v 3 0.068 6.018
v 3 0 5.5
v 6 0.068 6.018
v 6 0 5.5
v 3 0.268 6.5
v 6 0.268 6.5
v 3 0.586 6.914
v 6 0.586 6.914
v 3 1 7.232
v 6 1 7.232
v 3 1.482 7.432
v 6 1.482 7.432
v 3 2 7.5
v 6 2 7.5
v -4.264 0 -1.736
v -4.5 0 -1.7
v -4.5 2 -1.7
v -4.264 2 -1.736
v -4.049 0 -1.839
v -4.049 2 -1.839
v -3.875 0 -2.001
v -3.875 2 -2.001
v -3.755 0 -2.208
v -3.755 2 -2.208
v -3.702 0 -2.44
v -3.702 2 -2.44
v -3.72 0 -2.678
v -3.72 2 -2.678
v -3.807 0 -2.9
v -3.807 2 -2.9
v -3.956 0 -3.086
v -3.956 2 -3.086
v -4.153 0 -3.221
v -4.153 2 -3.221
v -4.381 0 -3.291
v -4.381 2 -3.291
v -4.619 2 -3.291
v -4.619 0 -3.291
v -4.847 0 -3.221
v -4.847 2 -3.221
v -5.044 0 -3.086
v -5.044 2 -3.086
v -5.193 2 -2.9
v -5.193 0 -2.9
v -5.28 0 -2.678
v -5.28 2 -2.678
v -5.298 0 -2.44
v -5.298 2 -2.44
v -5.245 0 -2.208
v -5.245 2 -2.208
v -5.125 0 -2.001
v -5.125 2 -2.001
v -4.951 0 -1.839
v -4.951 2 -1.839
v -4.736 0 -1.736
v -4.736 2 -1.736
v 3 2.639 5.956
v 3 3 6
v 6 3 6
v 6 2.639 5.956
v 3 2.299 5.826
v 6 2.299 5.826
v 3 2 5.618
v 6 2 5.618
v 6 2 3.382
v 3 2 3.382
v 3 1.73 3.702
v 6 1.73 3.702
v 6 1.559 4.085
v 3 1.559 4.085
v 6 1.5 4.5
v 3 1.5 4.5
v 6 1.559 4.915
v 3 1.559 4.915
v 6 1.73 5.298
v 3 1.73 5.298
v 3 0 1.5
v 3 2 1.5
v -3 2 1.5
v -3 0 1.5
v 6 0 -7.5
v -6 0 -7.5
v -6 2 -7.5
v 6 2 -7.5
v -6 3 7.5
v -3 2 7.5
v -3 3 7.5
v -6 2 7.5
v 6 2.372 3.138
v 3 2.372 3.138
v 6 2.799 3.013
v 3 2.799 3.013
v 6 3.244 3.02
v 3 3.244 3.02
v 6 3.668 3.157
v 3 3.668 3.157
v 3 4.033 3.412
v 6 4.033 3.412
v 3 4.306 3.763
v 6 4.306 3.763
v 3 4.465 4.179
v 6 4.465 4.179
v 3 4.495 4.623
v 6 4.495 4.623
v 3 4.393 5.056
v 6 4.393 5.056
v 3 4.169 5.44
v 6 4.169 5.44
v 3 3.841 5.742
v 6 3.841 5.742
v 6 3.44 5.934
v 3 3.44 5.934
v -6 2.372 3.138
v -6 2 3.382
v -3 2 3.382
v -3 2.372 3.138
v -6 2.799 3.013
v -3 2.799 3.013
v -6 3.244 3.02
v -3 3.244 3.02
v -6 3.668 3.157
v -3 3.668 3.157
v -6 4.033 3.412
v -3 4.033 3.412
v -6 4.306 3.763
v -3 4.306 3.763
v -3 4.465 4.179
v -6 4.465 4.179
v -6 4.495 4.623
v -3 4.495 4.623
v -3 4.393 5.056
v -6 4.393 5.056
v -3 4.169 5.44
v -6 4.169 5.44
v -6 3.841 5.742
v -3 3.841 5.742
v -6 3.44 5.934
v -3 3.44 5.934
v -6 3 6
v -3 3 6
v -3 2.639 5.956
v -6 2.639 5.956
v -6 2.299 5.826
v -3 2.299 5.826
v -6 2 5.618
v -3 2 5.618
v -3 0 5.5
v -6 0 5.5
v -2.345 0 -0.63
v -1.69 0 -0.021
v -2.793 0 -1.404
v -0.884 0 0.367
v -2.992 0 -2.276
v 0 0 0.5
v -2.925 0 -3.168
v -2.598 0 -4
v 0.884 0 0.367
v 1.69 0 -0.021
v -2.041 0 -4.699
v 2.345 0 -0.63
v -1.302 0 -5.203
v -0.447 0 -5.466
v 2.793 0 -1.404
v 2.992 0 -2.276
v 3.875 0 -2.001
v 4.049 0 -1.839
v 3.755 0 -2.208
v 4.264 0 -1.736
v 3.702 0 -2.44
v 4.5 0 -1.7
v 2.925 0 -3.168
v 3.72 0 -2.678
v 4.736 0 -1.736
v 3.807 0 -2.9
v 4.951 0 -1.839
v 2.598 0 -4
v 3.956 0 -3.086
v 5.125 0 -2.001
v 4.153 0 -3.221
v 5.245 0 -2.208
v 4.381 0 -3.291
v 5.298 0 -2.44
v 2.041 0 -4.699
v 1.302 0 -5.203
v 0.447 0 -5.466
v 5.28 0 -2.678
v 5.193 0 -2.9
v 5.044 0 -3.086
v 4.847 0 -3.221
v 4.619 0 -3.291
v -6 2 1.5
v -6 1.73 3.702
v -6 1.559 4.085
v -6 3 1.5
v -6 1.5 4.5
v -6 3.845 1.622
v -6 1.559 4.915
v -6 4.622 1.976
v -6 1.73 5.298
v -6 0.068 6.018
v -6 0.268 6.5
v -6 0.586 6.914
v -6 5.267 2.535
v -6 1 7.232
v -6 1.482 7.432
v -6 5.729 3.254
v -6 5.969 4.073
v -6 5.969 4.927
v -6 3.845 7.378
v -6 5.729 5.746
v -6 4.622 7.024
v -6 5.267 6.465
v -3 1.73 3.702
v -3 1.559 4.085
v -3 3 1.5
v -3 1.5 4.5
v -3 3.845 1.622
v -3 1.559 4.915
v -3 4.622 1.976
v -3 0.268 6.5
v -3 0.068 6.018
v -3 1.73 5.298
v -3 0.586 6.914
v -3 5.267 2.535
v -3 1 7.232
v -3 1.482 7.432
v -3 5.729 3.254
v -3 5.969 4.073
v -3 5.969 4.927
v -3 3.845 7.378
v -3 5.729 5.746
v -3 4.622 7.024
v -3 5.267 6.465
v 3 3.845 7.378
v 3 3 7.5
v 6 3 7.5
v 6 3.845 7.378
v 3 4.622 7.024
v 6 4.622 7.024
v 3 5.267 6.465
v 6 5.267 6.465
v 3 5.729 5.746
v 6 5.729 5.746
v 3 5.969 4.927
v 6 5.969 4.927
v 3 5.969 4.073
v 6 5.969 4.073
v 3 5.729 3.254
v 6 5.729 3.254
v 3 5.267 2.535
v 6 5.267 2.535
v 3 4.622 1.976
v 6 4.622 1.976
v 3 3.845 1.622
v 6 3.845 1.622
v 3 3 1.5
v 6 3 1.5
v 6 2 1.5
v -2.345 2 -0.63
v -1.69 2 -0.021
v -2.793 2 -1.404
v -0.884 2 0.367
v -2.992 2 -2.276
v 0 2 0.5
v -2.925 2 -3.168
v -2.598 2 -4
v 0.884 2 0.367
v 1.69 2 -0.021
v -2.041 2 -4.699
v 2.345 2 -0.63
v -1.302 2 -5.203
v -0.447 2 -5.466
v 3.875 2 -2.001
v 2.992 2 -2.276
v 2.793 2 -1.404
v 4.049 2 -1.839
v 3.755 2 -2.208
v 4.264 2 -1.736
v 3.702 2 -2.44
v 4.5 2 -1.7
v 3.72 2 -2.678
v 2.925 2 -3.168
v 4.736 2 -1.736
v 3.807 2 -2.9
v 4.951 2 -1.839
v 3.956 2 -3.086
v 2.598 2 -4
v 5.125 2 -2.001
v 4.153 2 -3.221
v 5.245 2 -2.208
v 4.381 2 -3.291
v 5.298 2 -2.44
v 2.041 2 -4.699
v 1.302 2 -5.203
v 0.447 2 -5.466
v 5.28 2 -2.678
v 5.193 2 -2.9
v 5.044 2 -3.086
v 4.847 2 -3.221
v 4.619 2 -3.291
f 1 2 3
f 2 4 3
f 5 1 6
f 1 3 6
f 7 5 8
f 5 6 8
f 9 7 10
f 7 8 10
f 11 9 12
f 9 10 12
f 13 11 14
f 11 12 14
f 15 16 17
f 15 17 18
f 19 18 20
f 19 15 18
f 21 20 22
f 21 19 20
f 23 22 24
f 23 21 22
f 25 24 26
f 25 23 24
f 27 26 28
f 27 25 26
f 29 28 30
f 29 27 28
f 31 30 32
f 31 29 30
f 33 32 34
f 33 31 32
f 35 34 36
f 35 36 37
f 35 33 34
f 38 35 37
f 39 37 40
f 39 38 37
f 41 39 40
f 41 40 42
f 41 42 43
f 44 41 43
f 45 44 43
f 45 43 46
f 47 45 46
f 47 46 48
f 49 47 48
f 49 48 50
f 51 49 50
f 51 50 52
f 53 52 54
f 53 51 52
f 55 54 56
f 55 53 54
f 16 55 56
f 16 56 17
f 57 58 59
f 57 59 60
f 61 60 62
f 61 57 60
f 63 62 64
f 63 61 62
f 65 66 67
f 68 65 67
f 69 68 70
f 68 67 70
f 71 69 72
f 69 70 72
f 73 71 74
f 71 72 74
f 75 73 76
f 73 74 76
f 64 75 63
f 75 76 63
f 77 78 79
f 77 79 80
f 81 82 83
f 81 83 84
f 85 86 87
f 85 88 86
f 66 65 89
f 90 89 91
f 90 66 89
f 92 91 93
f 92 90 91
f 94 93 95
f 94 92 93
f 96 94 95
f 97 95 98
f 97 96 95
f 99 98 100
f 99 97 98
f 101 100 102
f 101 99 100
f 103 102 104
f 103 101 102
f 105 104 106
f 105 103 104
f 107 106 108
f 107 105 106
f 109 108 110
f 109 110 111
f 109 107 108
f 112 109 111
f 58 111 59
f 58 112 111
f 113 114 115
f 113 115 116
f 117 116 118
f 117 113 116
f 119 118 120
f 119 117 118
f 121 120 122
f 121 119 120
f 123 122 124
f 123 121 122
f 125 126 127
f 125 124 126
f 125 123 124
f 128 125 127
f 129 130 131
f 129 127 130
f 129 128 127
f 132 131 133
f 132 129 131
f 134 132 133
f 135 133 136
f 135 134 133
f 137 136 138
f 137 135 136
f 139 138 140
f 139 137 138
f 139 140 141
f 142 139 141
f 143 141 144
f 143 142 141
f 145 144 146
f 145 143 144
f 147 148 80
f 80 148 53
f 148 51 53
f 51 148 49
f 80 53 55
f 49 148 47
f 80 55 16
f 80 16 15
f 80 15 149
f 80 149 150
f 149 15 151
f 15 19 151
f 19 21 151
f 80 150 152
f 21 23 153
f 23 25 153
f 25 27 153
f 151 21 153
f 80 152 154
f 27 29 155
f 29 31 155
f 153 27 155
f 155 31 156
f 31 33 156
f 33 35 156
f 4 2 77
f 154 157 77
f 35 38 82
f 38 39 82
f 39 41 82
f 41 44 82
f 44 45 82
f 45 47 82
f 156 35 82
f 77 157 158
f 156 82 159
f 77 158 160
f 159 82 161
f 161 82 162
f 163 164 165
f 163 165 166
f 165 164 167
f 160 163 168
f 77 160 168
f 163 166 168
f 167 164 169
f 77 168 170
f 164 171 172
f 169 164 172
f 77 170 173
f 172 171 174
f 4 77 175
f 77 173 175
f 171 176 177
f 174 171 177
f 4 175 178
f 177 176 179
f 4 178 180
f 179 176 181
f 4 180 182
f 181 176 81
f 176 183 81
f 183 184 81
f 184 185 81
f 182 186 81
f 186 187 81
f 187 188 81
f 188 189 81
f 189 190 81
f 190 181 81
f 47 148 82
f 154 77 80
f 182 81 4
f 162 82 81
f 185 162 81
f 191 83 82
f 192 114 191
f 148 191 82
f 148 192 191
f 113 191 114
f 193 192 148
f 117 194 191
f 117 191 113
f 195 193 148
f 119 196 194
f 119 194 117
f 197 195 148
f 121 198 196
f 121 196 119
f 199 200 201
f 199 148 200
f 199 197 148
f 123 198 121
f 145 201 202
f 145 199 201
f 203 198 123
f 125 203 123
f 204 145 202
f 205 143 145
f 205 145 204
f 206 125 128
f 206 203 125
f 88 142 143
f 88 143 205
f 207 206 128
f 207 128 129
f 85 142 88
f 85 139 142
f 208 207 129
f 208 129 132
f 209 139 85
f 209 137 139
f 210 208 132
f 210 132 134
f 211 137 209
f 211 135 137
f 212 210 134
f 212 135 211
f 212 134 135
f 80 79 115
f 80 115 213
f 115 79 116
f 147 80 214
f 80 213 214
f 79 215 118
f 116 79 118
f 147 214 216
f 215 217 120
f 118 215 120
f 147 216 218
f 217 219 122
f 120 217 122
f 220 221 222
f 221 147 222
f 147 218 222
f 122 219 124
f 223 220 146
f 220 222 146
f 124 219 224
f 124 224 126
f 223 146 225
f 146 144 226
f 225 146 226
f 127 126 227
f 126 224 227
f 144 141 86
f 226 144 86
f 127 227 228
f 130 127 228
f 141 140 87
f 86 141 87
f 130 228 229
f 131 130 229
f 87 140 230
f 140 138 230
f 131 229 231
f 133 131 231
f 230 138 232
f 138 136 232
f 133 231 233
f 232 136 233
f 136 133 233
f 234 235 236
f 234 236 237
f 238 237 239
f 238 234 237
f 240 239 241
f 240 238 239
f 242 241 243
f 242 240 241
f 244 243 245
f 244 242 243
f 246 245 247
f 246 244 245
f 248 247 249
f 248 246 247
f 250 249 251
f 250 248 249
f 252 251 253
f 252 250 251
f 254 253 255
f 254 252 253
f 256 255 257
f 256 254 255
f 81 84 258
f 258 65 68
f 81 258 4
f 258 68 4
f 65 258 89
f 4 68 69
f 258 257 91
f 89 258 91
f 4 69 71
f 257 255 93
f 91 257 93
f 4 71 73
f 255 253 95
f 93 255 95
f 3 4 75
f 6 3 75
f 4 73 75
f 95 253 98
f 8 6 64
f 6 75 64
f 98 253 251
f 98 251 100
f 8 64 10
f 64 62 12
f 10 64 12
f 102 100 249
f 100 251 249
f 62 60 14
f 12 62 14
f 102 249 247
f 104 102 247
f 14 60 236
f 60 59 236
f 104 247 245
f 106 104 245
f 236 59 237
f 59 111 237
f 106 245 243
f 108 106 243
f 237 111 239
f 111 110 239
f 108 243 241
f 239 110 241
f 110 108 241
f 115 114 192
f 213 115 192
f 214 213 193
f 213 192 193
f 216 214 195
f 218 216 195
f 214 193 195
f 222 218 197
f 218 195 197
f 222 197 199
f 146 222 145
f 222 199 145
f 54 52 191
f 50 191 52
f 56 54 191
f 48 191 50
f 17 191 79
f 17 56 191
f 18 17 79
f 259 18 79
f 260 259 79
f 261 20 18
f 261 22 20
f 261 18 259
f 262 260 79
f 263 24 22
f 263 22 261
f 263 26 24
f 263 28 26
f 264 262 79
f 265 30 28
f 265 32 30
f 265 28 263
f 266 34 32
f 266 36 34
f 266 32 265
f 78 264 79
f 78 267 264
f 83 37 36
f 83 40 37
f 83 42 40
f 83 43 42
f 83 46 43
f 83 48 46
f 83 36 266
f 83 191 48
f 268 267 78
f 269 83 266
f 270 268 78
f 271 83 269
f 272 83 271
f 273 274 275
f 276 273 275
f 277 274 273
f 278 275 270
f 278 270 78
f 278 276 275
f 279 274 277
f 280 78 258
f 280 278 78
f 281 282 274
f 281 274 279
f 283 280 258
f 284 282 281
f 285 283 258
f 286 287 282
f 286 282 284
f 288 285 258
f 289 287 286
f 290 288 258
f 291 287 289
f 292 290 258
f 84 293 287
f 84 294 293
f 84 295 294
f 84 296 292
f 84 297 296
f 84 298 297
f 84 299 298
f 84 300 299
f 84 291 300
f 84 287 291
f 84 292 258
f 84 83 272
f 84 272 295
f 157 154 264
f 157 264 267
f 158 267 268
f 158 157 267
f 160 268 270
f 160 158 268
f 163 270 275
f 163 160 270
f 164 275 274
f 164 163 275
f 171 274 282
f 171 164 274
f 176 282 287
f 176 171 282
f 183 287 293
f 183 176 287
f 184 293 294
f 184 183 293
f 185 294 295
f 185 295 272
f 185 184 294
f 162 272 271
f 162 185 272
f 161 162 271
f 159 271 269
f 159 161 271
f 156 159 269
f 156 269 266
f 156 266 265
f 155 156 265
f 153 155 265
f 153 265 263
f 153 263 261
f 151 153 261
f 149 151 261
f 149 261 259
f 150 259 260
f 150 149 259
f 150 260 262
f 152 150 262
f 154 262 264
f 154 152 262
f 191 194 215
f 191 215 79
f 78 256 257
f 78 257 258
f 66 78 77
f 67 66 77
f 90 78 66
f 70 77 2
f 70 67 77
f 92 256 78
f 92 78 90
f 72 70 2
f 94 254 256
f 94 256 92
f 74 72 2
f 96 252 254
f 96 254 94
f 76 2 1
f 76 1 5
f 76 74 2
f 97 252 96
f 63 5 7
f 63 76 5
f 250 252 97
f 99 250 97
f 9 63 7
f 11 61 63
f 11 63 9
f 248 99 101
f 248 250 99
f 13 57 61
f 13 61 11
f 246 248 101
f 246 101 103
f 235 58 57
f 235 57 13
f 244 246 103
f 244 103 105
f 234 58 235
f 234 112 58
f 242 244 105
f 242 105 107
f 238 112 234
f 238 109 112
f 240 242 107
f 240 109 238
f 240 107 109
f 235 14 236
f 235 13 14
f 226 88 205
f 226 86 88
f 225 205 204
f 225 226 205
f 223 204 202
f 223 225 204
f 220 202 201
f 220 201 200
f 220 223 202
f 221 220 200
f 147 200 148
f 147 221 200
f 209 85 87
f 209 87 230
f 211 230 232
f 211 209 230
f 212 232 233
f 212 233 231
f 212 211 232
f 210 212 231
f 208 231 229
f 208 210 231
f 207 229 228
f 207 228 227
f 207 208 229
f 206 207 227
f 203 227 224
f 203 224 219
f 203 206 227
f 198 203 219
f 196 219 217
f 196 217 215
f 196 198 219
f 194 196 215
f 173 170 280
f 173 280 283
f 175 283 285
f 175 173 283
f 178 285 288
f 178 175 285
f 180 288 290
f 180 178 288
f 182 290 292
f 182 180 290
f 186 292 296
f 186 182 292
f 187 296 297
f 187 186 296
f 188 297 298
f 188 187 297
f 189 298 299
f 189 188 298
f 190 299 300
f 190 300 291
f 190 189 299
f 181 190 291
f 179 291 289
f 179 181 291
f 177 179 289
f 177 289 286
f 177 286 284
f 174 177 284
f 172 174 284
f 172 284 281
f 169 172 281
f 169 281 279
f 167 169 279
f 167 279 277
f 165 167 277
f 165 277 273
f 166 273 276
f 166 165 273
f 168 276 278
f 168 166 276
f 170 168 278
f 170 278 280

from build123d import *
from build123d.topology import SkipClean

# Parameters (mm, degrees)
SKETCH_1_W               = 12
SKETCH_1_H               = 15
SKETCH_1_R               = 0.8
SKETCH_1_R_2             = 3
EXTRUDE_1_DEPTH          = 2
EXTRUDE_3_DEPTH          = 12
CUT_EXTRUDE_1_REACH      = 17.37
SKETCH_2_3_R             = 1.5
CUT_EXTRUDE_2_DEPTH      = 3
CUT_EXTRUDE_2_DEPTH_BACK = 3
FILLET_1_R               = 2


with BuildPart() as part:
    # 草图1 → 凸台-拉伸1 (new body)
    with BuildSketch(Plane(origin=(0, 0, 0), x_dir=(1, 0, 0), z_dir=(0, 1, 0))):
        Rectangle(SKETCH_1_W, SKETCH_1_H)
        with Locations(Location((-4.5, 2.5, 0), (0, 0, 270))):
            Circle(SKETCH_1_R, mode=Mode.SUBTRACT)
        with Locations(Location((4.5, 2.5, 0), (0, 0, 270))):
            Circle(SKETCH_1_R, mode=Mode.SUBTRACT)
        with Locations(Location((0, 2.5, 0), (0, 0, 270))):
            Circle(SKETCH_1_R_2, mode=Mode.SUBTRACT)
    extrude(amount=EXTRUDE_1_DEPTH)

    # 草图2 → 凸台-拉伸3 (add)
    with BuildSketch(Plane.ZY.offset(6)):
        with BuildLine():
            ThreePointArc((7.5, 3), (4.5, 6), (1.5, 3))
            Line((1.5, 3), (1.5, 2))
            Line((1.5, 2), (3.381966011, 2))
            ThreePointArc((3.381966011, 2), (3.964766865, 4.401258538), (6, 3))
            ThreePointArc((6, 3), (5.901258538, 2.464766865), (5.618033989, 2))
            Line((5.618033989, 2), (7.5, 2))
            Line((7.5, 2), (7.5, 3))
        make_face()
    extrude(amount=-EXTRUDE_3_DEPTH)

    # 草图2<3> → 切除-拉伸1 (cut, up to next)
    with BuildSketch(Plane.ZY.offset(6), mode=Mode.PRIVATE) as cut_extrude_1_sk1:
        with Locations((4.5, 3)):
            Circle(SKETCH_2_3_R)
    cut_extrude_1_tool1 = extrude(cut_extrude_1_sk1.sketch, amount=-CUT_EXTRUDE_1_REACH, mode=Mode.PRIVATE) & part.part
    add(cut_extrude_1_tool1.solids().sort_by_distance((-6, 3, 4.5))[0], mode=Mode.SUBTRACT)

    # 草图5 → 切除-拉伸2 (cut, two sides: drawn at the far end of the back side and taken through both)
    with SkipClean():  # the faces are left unmerged after this step: merging them gives an invalid solid
        with BuildSketch(Plane.ZY.offset(-CUT_EXTRUDE_2_DEPTH_BACK)):
            with BuildLine():
                Line((1.5, 2), (1.5, 0))
                Line((1.5, 0), (7.5, 0))
                Line((7.5, 0), (7.5, 3))
                ThreePointArc((7.5, 3), (4.5, 6), (1.5, 3))
                Line((1.5, 3), (1.5, 2))
            make_face()
        extrude(amount=CUT_EXTRUDE_2_DEPTH + CUT_EXTRUDE_2_DEPTH_BACK, mode=Mode.SUBTRACT)

    # 圆角1
    fillet_1_edges = [part.edges().sort_by_distance(p)[0] for p in [
        (-4.5, 0, 7.5),
        (4.5, 0, 7.5),
    ]]
    fillet(fillet_1_edges, radius=FILLET_1_R)


solid = part.part
